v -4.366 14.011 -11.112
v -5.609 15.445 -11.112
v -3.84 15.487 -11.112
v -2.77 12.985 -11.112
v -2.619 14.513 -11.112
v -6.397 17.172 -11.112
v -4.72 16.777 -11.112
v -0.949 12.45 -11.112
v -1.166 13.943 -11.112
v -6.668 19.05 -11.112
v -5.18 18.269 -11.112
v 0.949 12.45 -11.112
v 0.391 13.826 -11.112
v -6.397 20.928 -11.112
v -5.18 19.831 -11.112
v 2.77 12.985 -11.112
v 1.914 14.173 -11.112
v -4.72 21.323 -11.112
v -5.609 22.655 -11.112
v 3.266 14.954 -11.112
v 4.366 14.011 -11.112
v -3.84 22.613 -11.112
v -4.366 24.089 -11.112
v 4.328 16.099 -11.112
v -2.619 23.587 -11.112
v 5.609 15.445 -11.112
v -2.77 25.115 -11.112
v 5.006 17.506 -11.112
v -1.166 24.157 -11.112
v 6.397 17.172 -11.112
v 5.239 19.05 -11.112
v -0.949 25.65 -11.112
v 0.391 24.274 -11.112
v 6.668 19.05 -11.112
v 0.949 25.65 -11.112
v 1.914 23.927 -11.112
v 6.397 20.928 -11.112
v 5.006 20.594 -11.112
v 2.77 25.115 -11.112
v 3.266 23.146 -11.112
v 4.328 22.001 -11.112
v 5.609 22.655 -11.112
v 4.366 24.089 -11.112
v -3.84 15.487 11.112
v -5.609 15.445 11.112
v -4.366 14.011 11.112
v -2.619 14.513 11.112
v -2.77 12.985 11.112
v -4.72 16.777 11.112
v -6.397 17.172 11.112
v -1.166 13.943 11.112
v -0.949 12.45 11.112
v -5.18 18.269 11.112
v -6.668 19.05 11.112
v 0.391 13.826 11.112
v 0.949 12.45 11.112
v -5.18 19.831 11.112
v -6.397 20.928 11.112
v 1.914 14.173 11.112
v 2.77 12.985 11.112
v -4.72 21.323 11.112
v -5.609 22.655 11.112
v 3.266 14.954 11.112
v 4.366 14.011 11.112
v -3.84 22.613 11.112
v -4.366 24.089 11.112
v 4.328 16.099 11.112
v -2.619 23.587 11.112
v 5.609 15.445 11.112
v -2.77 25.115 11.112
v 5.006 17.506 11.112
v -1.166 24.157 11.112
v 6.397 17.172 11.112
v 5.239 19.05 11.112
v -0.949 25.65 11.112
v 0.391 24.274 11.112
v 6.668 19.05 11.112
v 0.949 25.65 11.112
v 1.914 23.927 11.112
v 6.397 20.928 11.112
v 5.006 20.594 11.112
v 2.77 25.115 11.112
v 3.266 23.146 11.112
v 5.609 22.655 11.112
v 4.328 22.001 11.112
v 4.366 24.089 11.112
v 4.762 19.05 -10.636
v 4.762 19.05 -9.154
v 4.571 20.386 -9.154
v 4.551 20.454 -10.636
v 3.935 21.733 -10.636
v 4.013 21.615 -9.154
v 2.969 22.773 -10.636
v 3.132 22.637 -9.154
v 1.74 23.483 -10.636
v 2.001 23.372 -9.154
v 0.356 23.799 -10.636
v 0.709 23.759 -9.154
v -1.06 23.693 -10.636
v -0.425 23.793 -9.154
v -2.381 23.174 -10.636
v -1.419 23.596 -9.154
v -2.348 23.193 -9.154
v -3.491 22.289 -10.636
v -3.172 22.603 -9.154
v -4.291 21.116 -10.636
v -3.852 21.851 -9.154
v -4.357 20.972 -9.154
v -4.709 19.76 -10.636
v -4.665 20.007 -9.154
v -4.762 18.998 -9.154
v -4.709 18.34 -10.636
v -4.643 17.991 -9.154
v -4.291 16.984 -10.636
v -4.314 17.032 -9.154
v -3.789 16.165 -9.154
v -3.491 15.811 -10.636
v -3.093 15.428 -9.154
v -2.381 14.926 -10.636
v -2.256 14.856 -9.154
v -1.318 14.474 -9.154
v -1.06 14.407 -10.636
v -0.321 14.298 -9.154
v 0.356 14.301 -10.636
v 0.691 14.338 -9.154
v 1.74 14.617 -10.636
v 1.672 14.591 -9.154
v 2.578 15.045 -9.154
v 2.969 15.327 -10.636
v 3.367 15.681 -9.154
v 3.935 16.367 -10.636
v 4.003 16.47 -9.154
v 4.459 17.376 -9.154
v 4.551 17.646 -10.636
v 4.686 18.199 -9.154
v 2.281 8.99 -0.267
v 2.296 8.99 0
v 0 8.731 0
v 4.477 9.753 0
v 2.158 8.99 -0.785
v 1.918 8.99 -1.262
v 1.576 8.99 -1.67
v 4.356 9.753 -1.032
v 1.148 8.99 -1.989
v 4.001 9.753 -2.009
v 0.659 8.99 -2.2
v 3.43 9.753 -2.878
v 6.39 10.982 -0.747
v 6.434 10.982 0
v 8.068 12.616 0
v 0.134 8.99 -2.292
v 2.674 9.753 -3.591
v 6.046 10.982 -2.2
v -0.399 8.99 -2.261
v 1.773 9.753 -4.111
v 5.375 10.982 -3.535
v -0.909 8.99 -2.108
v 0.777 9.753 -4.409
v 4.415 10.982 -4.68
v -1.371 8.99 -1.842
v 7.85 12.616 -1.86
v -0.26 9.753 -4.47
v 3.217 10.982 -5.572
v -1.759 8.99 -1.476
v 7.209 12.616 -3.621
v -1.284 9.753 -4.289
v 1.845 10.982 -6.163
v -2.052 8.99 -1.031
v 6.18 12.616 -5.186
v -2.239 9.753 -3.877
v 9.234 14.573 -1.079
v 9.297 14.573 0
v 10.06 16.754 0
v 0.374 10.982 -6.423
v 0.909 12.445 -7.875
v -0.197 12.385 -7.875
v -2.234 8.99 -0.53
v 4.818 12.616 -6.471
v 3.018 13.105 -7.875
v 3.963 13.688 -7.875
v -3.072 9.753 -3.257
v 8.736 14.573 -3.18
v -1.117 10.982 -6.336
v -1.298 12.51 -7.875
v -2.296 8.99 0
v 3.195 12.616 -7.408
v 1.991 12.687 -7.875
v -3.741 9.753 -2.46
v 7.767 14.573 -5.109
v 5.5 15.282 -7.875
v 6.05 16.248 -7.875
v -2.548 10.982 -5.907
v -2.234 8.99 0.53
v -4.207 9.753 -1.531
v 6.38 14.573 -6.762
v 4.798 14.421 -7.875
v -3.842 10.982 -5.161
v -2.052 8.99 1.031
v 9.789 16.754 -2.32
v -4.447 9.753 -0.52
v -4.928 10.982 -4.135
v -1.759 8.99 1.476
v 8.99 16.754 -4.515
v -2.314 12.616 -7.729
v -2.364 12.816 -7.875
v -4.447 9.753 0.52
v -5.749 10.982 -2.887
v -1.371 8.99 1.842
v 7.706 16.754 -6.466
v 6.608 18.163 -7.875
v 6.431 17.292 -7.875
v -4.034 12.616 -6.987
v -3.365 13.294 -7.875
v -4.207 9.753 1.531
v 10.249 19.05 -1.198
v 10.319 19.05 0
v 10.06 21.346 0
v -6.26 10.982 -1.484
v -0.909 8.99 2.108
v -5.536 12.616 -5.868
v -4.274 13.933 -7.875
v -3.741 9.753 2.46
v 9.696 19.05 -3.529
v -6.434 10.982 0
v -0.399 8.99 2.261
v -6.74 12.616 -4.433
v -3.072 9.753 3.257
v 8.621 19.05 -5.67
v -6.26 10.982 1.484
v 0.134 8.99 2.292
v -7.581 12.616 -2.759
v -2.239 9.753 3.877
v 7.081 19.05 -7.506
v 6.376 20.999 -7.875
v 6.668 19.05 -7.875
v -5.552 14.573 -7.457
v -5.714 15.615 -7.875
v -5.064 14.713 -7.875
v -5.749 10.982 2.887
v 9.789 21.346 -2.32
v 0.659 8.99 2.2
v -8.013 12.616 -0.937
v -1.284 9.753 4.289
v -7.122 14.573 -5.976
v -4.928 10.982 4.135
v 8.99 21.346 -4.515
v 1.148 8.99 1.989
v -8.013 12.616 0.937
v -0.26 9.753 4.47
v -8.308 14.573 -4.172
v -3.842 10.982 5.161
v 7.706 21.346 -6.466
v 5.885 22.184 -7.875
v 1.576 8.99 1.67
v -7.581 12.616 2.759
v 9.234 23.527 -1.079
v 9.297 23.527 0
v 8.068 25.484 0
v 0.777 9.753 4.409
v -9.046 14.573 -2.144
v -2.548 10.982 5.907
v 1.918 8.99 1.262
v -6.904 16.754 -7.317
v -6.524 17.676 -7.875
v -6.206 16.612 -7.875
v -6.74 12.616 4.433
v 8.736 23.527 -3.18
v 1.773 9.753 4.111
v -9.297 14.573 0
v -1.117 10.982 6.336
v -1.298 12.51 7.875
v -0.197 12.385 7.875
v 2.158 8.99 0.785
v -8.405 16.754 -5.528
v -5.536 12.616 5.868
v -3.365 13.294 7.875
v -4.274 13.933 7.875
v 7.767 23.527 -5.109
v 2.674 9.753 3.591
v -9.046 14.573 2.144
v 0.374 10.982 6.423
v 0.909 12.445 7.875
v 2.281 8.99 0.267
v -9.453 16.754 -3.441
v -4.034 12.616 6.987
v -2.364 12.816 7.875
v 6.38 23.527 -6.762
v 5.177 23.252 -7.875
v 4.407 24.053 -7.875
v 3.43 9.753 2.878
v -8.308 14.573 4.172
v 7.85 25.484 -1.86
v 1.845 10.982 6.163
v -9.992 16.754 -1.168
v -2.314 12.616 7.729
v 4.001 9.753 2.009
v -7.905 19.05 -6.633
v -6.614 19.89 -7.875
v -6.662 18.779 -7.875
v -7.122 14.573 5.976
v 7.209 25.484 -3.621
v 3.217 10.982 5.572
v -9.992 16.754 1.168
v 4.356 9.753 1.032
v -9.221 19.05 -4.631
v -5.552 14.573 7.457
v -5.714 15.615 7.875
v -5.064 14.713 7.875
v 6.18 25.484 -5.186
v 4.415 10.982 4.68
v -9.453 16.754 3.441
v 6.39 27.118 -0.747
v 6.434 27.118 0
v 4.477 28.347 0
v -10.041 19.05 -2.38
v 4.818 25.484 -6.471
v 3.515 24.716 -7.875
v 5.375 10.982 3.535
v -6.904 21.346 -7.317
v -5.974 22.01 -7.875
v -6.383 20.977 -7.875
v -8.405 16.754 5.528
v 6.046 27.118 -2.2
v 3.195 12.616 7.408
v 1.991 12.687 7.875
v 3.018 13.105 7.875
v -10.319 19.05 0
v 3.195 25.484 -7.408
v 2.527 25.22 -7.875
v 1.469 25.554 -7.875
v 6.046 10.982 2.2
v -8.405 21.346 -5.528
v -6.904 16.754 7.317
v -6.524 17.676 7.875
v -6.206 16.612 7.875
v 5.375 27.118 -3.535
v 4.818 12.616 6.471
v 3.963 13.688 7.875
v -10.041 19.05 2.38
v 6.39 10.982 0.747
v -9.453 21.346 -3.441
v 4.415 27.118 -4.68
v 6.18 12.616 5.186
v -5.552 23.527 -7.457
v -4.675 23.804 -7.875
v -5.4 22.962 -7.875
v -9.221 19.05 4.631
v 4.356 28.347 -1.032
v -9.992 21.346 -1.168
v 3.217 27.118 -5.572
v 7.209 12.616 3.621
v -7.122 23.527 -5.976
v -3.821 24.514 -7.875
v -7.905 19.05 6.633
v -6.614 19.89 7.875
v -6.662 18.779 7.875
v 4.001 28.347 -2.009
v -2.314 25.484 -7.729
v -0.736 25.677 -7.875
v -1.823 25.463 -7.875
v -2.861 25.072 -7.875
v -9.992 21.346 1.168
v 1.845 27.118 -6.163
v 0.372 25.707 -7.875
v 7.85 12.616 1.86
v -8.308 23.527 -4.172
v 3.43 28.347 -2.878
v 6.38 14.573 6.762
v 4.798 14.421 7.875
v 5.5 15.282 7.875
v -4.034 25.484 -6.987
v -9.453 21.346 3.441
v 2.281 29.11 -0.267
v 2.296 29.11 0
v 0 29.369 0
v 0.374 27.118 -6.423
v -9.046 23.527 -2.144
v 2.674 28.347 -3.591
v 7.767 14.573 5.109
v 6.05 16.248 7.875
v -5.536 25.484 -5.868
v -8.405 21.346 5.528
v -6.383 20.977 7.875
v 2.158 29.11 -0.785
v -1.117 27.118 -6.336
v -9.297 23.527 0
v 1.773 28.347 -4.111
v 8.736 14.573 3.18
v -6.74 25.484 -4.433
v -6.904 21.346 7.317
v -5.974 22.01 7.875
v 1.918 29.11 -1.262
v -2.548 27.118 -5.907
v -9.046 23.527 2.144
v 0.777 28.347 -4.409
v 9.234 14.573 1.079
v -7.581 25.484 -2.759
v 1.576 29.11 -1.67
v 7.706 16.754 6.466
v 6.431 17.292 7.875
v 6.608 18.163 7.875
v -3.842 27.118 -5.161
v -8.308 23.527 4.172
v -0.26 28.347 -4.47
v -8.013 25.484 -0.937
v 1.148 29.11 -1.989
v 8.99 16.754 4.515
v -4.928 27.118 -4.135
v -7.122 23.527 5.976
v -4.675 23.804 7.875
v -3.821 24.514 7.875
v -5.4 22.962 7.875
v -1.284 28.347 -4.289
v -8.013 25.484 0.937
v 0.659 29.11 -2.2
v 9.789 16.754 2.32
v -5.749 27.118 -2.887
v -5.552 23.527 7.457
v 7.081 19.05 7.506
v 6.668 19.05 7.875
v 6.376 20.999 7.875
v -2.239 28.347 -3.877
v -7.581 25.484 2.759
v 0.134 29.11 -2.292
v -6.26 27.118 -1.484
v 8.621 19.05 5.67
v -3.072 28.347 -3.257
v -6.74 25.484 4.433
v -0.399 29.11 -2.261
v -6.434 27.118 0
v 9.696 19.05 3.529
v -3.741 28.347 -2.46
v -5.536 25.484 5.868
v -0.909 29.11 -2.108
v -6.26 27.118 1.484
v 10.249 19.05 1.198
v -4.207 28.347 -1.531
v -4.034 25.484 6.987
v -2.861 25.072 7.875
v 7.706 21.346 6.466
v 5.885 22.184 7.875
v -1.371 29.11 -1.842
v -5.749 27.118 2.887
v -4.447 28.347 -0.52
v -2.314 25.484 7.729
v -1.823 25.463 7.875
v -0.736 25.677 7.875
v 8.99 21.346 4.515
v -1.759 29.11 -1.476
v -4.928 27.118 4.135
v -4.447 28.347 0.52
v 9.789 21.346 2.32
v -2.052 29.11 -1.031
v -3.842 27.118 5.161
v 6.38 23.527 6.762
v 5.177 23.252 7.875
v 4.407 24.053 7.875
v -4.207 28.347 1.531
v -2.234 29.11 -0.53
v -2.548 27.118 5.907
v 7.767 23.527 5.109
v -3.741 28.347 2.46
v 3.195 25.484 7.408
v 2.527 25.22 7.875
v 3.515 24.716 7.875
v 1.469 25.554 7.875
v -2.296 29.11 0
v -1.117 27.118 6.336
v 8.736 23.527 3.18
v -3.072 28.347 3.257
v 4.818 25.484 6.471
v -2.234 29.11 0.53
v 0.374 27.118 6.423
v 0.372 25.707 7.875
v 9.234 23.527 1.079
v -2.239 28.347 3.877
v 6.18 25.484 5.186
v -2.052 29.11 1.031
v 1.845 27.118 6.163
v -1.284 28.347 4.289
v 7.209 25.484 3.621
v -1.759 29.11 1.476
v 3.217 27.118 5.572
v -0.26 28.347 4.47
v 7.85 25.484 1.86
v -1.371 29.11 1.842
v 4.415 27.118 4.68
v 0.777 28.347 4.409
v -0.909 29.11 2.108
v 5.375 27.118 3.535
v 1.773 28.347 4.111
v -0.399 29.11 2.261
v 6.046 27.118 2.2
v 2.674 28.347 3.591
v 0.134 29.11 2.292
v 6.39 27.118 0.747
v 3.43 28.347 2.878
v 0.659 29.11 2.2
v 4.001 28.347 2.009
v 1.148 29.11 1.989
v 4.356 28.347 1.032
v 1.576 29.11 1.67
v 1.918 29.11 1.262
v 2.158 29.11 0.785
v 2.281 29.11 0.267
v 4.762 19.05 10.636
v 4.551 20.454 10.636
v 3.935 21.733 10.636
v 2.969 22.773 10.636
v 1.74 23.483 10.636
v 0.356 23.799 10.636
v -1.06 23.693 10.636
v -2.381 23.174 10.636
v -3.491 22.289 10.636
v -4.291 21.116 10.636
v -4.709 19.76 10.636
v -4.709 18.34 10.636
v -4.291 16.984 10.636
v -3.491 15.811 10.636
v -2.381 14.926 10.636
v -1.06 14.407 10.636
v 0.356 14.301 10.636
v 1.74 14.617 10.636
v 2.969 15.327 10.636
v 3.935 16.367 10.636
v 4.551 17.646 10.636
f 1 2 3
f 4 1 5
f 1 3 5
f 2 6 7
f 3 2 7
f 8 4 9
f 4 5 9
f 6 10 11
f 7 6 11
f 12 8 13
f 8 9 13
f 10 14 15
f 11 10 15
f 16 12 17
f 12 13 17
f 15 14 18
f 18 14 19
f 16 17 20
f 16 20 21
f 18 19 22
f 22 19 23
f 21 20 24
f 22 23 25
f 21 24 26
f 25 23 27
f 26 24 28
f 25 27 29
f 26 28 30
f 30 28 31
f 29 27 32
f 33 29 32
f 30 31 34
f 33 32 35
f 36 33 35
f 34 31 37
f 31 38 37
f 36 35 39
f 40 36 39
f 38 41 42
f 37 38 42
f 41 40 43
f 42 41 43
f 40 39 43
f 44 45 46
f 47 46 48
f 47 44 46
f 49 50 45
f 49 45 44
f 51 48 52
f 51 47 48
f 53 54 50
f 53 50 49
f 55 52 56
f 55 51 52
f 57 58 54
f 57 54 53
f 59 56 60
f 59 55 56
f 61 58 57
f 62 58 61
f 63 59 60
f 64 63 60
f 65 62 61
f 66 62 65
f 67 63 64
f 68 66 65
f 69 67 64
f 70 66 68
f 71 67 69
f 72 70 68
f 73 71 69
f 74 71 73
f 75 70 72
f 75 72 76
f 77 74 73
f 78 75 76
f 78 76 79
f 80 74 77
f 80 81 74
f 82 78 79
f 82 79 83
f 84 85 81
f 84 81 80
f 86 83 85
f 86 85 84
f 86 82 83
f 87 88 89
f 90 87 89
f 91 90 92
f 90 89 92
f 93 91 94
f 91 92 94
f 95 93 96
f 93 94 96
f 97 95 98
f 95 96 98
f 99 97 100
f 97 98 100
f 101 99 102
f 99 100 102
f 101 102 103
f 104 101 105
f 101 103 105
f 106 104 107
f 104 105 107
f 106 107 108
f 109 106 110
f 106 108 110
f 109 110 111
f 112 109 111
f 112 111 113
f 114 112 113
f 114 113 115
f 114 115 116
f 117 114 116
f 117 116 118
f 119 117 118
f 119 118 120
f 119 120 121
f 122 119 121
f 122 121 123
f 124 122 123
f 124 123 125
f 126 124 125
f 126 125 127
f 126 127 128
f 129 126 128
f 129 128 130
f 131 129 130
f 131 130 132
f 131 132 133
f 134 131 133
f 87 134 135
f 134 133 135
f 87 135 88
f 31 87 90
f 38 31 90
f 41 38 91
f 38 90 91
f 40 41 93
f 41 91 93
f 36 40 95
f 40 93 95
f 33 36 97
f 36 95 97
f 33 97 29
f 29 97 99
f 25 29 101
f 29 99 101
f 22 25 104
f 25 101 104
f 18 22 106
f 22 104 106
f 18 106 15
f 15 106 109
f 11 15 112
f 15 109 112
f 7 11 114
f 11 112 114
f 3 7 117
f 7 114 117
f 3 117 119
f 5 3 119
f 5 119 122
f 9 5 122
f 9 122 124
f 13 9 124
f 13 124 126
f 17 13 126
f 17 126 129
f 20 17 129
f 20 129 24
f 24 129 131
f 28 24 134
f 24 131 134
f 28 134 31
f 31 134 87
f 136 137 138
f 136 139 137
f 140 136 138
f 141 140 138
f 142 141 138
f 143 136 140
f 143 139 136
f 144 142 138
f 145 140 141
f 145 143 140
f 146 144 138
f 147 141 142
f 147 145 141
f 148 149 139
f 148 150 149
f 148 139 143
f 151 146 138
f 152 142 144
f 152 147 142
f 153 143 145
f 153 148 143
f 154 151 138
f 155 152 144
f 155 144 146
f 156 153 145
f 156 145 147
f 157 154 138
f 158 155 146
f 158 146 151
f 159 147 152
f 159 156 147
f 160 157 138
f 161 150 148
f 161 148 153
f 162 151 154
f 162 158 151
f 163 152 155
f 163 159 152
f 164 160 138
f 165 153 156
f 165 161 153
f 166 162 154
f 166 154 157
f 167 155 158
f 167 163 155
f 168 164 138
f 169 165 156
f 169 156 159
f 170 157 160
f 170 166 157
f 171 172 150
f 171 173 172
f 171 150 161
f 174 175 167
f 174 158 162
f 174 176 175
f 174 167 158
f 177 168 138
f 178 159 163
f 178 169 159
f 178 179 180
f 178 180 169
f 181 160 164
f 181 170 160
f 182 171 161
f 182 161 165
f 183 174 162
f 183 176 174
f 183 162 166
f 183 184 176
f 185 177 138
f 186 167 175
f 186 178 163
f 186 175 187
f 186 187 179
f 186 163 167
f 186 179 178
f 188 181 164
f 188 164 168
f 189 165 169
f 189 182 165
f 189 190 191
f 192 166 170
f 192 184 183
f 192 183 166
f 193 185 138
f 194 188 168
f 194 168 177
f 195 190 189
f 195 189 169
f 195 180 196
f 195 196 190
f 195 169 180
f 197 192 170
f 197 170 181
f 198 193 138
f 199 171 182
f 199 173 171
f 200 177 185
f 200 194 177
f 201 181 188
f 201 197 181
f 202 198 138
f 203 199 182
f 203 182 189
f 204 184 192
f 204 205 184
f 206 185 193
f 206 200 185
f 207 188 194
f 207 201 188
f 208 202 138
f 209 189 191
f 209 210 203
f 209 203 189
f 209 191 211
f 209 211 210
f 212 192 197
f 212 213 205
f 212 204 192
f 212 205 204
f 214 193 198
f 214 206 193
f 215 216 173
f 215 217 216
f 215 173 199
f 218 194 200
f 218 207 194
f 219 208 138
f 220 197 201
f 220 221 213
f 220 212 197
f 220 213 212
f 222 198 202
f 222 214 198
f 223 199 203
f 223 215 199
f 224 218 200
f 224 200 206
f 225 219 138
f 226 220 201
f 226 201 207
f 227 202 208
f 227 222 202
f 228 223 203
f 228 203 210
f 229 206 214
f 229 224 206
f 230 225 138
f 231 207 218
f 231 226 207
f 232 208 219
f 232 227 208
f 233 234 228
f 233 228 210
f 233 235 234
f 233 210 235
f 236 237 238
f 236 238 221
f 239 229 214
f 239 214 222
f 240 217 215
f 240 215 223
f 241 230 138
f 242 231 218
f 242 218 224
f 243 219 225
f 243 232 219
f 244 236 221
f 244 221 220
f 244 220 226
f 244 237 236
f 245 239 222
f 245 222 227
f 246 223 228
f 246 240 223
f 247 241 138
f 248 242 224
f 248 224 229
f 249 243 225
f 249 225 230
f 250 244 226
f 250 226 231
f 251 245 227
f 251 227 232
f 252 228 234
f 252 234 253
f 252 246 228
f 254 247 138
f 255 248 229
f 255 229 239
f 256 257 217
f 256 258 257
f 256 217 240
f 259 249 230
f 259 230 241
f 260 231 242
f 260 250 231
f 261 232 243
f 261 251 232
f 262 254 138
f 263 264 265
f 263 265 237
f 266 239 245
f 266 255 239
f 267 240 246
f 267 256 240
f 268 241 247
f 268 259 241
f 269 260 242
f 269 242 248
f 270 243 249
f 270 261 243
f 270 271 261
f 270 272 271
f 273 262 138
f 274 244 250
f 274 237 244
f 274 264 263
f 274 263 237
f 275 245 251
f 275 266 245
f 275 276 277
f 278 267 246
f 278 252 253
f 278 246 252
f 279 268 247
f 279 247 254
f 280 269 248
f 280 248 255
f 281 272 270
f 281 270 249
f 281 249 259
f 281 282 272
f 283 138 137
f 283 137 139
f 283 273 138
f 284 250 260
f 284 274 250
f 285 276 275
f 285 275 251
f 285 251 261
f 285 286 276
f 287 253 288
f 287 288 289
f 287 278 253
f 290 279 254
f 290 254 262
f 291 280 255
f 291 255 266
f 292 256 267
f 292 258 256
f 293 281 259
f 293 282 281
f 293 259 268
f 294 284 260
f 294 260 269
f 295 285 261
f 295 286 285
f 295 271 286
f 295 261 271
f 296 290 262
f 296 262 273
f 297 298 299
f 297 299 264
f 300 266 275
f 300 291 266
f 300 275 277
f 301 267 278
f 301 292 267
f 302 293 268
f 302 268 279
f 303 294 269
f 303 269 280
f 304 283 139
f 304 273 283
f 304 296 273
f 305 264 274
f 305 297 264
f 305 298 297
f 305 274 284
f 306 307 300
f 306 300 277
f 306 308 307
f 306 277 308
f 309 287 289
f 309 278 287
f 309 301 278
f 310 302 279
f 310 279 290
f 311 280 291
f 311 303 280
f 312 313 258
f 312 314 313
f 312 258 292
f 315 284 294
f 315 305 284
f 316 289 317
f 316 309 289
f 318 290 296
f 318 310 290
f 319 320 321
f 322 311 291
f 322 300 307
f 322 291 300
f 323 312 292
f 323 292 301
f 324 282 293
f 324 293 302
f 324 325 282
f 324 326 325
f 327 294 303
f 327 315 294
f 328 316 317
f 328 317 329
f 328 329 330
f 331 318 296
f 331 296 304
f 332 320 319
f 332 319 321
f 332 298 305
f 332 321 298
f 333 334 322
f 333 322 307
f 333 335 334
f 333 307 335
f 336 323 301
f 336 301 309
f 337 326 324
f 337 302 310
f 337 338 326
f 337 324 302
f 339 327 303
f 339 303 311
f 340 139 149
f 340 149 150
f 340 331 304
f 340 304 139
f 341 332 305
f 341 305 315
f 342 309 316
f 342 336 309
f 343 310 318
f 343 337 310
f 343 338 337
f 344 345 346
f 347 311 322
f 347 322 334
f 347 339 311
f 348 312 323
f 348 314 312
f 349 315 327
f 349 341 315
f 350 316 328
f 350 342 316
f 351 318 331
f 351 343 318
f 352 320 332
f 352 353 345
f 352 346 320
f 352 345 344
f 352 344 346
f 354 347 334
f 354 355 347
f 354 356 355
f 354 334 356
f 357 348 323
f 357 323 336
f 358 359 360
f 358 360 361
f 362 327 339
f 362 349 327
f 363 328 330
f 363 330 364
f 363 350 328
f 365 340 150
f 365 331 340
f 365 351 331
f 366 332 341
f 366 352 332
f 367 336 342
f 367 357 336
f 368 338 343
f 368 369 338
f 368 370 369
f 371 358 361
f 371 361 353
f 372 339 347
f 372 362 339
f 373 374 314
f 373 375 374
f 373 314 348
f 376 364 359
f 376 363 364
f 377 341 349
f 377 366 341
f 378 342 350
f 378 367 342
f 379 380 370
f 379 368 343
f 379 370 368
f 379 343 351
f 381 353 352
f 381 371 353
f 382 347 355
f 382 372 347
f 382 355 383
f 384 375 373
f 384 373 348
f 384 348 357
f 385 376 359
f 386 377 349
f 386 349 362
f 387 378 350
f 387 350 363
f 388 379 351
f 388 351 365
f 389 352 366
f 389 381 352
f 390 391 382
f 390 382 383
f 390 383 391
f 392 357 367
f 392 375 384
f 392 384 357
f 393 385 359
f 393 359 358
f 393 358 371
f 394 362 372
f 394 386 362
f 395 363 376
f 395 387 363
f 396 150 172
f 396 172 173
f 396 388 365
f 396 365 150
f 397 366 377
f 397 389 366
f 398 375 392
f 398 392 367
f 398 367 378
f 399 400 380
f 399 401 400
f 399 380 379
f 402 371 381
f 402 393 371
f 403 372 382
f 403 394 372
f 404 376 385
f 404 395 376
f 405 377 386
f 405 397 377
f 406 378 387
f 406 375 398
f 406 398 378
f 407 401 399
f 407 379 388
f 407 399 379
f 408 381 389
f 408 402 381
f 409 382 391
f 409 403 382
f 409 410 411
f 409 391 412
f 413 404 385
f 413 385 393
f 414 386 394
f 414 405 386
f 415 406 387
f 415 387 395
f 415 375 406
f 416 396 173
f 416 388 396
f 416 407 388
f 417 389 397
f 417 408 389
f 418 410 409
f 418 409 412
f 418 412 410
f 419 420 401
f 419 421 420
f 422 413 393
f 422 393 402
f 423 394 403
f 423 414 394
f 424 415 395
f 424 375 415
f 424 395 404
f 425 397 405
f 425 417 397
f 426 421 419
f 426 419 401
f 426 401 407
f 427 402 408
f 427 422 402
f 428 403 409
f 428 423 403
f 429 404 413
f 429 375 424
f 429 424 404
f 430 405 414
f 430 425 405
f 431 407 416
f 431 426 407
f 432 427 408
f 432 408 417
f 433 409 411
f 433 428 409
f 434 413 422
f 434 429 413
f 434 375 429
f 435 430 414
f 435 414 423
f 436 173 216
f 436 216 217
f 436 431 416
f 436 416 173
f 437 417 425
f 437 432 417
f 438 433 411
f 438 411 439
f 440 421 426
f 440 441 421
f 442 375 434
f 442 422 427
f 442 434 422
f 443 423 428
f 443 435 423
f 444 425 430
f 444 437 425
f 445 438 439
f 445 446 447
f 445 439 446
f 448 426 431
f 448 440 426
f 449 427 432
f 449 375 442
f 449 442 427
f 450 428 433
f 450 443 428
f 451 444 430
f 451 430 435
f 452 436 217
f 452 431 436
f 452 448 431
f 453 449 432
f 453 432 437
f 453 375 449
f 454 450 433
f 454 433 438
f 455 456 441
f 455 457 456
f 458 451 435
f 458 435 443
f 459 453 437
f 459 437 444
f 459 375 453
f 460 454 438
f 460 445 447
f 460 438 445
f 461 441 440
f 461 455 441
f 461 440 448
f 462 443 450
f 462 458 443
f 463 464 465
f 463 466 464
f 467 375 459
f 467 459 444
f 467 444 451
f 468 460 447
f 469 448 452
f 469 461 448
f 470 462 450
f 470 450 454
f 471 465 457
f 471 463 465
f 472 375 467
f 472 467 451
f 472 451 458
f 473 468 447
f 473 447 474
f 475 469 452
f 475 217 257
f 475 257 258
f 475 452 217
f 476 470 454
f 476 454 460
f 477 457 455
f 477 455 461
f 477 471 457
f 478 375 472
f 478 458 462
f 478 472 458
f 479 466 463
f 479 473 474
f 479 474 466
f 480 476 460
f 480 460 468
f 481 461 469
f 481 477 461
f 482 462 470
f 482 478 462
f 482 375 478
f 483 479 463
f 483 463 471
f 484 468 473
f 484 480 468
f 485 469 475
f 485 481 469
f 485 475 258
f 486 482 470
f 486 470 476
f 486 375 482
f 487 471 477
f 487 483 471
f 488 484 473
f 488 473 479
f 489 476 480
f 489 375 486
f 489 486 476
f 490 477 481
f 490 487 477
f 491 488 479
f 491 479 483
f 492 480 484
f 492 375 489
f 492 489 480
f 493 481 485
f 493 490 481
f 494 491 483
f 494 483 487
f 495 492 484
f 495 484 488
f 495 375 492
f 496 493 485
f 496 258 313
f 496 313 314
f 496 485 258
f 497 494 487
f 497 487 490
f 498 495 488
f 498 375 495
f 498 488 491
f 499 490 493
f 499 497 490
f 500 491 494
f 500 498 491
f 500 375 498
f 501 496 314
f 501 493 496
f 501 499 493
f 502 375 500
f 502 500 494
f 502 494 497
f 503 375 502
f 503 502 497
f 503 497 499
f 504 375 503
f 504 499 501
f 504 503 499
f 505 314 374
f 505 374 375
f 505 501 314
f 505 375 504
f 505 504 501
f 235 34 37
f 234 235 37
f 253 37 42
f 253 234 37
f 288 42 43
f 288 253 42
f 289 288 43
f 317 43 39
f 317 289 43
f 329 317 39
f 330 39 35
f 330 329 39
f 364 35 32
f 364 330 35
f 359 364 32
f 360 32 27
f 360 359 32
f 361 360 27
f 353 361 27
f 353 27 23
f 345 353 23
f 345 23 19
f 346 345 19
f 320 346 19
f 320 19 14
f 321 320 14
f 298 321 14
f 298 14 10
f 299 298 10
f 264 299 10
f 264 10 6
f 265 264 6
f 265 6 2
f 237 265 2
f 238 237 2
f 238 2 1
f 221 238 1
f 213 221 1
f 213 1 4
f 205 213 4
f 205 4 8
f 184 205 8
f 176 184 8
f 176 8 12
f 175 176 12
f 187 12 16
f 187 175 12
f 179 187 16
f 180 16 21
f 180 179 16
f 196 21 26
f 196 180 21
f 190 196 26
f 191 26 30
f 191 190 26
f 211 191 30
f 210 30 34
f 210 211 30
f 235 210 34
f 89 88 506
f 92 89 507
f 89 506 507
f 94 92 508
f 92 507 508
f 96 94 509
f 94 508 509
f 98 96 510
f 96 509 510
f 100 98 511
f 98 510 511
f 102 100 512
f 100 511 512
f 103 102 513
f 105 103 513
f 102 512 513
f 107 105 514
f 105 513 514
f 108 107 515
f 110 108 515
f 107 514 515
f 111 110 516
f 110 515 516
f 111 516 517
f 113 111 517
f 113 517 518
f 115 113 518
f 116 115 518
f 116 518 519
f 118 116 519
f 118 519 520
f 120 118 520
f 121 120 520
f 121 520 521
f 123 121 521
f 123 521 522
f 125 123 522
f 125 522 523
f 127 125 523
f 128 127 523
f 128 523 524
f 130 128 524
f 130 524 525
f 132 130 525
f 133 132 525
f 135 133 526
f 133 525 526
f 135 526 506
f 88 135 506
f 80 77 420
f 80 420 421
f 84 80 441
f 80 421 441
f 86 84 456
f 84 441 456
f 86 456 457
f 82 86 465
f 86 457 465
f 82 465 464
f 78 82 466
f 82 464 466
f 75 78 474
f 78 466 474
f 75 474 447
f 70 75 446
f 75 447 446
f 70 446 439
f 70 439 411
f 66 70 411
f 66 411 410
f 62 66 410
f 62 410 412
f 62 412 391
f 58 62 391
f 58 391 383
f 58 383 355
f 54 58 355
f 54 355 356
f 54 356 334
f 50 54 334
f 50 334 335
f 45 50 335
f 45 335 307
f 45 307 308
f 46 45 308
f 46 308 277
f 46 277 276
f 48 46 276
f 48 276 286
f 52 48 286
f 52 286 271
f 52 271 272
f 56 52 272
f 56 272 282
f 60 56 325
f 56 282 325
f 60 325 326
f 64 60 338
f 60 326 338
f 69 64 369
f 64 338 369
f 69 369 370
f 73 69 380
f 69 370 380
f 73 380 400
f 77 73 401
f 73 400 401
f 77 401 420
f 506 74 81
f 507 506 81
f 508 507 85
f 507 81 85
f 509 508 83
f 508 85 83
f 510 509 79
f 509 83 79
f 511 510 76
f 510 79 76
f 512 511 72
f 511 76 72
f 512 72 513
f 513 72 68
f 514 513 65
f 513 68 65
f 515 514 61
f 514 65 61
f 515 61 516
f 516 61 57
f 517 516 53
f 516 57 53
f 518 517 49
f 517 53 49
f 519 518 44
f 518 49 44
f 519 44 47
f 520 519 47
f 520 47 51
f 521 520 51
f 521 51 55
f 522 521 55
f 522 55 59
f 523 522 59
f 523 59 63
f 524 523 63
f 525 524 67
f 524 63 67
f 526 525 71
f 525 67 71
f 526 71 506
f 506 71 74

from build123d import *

# Parameters (mm, degrees)
SKETCH10_R              = 4.7625
CUT_EXTRUDE4_DEPTH      = 11.31875
CUT_EXTRUDE4_DEPTH_BACK = 11.31875
SKETCH12_R              = 6.6675
SKETCH12_R_2            = 4.7625
EXTRUDE1_DEPTH          = 11.1125
EXTRUDE1_DEPTH_BACK     = 11.1125
CHAMFER1_SIZE           = 0.47625


with BuildPart() as part:
    # Sketch7 → Revolve3 (revolve)
    with BuildSketch(Plane.XY):
        with BuildLine():
            Line((0, 29.36875), (0, 8.73125))
            ThreePointArc((0, 8.73125), (10.31875, 19.05), (0, 29.36875))
        make_face()
    revolve(axis=Axis((0, 0, 0), (0, 1, 0)))

    # Sketch10 → Cut-Extrude4 (cut, two sides)
    with BuildSketch(Plane.XY) as cut_extrude4_sk:
        with Locations((0, 19.05)):
            Circle(SKETCH10_R)
    extrude(amount=CUT_EXTRUDE4_DEPTH, mode=Mode.SUBTRACT)
    extrude(cut_extrude4_sk.sketch, amount=-CUT_EXTRUDE4_DEPTH_BACK, mode=Mode.SUBTRACT)

    # Sketch12 → Extrude1 (add, two sides)
    with BuildSketch(Plane.XY) as extrude1_sk:
        with Locations((0, 19.05)):
            Circle(SKETCH12_R)
        with Locations((0, 19.05)):
            Circle(SKETCH12_R_2, mode=Mode.SUBTRACT)
    extrude(amount=EXTRUDE1_DEPTH)
    extrude(extrude1_sk.sketch, amount=-EXTRUDE1_DEPTH_BACK)

    # Chamfer1
    chamfer1_edges = [part.edges().sort_by_distance(p)[0] for p in [
        (-4.7625, 19.05, 11.1125),
        (-4.7625, 19.05, -11.1125),
    ]]
    chamfer(chamfer1_edges, length=CHAMFER1_SIZE)


solid = part.part
